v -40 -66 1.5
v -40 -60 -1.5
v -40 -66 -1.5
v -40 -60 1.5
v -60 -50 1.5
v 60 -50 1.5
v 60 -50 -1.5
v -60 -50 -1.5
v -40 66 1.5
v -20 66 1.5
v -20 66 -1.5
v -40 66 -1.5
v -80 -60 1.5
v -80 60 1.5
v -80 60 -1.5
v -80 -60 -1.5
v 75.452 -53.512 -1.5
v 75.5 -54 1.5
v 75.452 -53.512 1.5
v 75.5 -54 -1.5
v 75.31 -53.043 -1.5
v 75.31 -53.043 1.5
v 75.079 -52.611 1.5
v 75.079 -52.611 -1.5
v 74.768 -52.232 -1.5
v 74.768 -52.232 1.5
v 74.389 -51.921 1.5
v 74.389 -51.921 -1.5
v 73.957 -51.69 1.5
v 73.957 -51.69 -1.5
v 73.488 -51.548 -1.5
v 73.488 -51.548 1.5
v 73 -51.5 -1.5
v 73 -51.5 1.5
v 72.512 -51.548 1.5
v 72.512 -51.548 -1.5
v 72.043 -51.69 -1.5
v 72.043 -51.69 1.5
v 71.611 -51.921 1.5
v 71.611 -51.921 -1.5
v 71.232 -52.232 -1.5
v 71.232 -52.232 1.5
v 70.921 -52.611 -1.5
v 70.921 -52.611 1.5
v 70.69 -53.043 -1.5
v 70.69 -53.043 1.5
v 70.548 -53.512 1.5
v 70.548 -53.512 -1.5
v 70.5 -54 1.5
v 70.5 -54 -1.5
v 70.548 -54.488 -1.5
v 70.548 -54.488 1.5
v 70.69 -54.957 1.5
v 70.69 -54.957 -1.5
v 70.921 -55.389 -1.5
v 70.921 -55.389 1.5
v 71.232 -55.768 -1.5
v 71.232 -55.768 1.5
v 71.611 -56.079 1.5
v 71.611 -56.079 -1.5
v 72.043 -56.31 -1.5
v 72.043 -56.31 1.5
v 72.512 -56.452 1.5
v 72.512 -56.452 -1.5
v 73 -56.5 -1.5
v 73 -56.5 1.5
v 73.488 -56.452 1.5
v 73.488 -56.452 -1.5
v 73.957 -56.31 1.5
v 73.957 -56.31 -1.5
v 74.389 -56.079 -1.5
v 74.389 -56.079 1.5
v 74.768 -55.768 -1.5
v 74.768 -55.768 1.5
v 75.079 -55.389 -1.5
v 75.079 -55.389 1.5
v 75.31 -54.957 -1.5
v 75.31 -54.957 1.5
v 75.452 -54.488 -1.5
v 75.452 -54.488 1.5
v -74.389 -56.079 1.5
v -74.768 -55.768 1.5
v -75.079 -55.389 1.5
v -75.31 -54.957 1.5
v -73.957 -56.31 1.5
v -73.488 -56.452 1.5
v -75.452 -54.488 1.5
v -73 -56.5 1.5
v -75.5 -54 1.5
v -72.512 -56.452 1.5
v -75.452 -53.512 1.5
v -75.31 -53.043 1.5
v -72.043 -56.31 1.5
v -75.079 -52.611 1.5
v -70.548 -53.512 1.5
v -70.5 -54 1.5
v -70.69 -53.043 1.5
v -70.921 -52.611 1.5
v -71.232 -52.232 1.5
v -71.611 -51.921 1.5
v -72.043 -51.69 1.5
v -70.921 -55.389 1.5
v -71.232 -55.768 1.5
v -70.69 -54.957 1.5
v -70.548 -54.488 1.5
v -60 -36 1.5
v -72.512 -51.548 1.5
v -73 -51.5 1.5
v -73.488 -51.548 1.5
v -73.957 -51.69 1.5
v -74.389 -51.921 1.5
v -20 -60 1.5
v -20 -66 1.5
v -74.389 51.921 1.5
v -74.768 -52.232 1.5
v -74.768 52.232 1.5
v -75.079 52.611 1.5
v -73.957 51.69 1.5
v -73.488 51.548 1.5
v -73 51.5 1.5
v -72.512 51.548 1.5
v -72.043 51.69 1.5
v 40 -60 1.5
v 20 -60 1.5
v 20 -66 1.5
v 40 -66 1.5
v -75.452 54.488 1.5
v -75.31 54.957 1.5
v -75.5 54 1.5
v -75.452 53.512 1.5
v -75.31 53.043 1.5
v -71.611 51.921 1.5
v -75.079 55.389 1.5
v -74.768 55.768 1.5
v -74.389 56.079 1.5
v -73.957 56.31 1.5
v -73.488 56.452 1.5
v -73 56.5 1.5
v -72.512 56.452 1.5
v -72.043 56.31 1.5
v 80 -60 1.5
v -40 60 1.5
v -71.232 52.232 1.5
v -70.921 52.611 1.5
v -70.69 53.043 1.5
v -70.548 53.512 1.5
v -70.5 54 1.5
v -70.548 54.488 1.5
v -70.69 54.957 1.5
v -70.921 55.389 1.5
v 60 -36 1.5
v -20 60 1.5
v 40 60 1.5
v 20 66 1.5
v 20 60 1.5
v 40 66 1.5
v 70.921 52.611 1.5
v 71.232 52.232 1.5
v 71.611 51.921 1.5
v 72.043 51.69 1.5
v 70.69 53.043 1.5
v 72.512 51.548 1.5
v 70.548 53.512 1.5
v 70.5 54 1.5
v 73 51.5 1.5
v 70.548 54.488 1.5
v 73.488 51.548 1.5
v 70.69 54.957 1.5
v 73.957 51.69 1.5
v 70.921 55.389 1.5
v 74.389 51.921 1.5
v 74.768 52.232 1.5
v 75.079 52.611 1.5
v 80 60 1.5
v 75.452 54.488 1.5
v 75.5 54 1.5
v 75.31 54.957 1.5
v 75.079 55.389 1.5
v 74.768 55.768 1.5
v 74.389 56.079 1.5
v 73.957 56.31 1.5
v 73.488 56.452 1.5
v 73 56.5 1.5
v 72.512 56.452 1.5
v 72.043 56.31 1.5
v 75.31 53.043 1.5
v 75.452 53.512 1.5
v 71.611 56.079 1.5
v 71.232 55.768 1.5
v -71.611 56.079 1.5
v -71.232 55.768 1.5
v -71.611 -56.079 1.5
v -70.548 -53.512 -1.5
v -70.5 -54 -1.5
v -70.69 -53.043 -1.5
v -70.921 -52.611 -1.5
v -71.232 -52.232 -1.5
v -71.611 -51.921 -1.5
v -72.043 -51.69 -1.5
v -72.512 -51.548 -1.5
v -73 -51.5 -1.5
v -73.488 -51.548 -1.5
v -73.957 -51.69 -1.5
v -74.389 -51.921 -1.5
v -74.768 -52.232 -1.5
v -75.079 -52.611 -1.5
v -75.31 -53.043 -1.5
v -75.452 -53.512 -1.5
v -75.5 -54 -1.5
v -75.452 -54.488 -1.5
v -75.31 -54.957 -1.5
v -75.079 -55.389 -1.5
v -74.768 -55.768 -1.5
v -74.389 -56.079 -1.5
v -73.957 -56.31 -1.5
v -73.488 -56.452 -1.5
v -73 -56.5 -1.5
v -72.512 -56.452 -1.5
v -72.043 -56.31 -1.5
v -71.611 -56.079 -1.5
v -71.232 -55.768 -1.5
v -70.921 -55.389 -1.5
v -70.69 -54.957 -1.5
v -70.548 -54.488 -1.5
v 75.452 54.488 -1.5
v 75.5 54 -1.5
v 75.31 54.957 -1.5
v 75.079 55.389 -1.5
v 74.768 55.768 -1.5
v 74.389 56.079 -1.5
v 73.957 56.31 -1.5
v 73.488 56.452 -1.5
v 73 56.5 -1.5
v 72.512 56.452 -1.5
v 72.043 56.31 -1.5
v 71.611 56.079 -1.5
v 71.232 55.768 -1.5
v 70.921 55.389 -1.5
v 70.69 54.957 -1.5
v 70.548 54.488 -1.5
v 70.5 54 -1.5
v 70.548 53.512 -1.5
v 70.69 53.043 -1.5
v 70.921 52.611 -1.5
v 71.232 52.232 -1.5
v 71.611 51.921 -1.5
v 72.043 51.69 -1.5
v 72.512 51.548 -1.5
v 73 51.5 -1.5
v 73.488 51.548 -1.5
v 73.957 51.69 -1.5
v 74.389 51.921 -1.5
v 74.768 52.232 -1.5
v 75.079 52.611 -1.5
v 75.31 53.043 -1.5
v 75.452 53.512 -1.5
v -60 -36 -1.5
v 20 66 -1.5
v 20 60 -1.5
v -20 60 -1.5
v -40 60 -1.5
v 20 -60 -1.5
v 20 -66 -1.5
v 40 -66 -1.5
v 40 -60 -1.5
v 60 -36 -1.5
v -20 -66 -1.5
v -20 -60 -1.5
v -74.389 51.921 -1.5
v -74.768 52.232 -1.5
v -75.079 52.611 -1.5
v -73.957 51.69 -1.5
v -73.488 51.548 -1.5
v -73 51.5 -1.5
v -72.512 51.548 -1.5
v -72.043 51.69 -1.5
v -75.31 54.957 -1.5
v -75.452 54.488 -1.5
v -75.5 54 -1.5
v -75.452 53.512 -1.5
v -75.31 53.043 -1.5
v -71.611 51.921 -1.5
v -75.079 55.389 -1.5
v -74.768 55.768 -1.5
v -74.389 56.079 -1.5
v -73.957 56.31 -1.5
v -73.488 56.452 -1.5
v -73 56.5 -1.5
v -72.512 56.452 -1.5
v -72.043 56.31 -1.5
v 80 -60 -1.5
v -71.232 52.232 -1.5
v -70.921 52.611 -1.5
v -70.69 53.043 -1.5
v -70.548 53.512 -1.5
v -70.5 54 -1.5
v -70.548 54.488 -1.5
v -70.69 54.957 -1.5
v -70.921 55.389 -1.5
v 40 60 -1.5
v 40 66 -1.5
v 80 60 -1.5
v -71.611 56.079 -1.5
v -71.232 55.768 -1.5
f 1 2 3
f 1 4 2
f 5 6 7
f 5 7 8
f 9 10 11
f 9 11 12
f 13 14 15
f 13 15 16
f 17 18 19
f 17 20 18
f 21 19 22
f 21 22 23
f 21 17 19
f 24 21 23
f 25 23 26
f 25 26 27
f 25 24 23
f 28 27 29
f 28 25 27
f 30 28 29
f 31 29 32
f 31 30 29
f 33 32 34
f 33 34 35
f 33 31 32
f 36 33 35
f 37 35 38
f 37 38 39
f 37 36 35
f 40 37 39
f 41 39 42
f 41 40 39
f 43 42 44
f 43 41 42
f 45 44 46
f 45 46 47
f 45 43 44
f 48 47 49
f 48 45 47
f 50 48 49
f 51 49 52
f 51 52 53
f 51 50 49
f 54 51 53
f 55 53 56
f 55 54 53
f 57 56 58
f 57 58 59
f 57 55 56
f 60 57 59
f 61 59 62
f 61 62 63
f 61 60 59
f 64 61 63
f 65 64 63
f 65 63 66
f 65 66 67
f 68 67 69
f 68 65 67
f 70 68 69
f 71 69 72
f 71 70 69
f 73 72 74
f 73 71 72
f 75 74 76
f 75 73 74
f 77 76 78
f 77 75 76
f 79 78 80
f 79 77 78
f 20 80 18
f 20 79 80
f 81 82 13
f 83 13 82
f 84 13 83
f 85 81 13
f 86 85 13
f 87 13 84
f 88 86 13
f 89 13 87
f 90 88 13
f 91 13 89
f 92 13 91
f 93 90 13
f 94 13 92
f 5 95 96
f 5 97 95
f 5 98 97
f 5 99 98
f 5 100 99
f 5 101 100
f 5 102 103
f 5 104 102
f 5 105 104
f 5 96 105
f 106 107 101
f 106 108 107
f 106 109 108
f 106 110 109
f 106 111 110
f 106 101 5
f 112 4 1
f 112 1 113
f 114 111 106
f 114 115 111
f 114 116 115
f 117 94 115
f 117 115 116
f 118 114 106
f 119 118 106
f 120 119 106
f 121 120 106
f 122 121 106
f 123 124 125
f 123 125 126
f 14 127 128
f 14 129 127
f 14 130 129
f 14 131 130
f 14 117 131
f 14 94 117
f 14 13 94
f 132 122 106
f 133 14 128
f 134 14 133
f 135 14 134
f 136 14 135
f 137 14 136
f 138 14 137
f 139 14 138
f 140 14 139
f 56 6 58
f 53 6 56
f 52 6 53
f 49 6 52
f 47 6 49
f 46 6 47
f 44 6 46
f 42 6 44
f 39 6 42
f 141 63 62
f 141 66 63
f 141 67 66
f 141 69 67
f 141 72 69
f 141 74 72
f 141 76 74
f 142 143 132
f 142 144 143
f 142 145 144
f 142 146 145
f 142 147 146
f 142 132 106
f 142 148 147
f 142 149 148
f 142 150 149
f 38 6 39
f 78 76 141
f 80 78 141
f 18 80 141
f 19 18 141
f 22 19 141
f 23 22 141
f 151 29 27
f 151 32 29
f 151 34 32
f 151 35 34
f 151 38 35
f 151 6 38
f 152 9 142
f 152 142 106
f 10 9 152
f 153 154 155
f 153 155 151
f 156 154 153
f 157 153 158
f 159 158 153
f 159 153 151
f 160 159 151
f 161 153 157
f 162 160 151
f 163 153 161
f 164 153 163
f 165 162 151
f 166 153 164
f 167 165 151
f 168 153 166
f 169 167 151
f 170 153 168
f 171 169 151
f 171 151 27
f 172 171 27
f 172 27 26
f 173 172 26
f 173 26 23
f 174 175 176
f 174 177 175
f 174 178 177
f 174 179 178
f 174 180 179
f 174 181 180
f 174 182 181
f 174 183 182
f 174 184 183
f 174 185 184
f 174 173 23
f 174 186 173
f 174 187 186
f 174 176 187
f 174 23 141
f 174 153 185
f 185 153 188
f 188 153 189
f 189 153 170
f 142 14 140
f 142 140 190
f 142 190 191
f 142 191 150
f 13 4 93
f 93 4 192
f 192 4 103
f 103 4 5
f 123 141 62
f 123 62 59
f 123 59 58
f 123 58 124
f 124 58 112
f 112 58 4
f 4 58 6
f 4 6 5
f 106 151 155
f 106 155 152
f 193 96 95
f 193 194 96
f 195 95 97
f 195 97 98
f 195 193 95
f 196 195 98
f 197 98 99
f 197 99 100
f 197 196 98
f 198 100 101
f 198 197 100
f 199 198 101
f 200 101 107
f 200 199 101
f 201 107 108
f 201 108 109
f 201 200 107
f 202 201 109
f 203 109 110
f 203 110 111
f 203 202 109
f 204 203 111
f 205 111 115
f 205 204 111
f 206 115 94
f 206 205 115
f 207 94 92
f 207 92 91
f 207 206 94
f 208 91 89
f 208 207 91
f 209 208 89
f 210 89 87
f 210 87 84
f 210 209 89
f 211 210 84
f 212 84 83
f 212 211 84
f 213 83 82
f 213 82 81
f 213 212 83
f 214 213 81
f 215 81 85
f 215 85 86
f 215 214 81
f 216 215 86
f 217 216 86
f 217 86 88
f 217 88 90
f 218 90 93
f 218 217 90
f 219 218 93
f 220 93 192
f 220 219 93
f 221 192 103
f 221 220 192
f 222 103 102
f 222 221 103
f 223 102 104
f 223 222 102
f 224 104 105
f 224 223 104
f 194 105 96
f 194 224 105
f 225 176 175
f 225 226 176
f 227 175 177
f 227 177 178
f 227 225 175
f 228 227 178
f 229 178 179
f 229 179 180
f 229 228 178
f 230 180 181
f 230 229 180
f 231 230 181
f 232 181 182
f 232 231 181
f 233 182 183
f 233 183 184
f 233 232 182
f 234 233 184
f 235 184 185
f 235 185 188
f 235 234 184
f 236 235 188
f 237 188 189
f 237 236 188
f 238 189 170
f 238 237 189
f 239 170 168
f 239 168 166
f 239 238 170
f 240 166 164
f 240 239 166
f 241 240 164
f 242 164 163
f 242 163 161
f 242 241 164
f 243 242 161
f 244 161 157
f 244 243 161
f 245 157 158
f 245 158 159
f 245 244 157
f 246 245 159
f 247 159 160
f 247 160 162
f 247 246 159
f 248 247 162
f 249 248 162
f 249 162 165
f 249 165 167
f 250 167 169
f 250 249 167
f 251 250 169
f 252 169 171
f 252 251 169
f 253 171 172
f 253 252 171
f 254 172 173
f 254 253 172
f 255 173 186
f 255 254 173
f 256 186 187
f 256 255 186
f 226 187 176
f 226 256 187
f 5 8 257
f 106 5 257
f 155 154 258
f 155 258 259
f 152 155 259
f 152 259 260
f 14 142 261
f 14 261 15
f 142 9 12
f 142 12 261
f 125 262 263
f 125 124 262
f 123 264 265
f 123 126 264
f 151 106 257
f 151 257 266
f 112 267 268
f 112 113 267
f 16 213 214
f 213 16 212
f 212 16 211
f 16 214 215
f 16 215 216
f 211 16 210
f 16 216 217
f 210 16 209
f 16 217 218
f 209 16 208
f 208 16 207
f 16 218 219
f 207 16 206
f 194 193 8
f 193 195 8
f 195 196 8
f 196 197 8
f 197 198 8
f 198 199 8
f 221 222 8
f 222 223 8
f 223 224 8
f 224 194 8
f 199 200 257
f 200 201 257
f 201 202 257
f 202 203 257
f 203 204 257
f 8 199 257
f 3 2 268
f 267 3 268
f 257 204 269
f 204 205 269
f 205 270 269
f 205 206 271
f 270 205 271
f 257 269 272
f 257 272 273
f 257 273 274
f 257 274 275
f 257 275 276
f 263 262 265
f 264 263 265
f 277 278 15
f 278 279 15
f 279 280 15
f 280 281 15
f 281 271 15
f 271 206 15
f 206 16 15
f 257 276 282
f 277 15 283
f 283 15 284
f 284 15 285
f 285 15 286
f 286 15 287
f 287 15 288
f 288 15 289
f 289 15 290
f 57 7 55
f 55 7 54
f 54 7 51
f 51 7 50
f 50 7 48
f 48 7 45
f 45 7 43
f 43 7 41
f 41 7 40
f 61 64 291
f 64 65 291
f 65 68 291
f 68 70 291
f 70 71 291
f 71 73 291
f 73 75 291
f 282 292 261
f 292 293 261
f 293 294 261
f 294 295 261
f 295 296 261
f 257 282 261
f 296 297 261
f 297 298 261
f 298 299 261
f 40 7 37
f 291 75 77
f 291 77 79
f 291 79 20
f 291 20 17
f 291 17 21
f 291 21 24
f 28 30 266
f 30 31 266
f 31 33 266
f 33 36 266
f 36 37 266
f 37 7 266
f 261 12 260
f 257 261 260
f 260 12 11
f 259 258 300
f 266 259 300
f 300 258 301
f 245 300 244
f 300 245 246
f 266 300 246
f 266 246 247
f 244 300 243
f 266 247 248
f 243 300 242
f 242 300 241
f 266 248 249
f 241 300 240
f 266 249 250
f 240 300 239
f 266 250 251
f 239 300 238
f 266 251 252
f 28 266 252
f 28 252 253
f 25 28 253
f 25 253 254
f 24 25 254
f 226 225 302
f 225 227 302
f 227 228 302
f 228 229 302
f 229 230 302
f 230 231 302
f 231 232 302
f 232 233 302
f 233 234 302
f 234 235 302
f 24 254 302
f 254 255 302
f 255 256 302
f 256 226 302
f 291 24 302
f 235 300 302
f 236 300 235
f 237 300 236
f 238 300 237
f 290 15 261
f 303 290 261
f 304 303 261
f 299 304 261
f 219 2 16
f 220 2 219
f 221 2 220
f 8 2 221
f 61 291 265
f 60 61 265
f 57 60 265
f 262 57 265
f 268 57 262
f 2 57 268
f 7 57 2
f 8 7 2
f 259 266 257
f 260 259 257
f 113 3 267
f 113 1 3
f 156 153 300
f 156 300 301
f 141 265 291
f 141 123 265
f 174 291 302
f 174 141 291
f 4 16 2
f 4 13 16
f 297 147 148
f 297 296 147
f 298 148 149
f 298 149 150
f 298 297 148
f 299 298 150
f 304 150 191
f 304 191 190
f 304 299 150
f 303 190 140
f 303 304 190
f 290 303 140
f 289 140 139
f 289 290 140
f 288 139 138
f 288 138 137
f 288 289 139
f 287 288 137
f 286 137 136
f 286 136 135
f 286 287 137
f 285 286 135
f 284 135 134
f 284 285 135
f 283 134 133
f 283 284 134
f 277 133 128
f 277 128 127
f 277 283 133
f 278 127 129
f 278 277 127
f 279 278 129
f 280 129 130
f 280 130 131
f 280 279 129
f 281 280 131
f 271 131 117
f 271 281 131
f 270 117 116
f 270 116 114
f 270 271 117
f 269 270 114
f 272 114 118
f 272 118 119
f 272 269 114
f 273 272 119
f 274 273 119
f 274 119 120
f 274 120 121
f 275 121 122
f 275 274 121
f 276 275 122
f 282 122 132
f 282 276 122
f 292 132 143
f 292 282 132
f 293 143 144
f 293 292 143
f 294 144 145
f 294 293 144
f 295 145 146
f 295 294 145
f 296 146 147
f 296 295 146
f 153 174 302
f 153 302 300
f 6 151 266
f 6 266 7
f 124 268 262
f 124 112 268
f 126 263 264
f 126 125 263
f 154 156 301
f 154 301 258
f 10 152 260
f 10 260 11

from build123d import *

# Parameters (mm, degrees)
F0_R     = 2.5
F1_DEPTH = 1.5


with BuildPart() as f1:
    # F0 (on Top) → F1 (new body, symmetric)
    with BuildSketch(Plane.XY):
        Polygon((80, -60), (80, 60), (40, 60), (40, 66), (20, 66), (20, 60), (-20, 60), (-20, 66), (-40, 66), (-40, 60), (-80, 60), (-80, -60), (-40, -60), (-40, -66), (-20, -66), (-20, -60), (20, -60), (20, -66), (40, -66), (40, -60), align=None)
        with Locations((-73, -54)):
            Circle(F0_R, mode=Mode.SUBTRACT)
        Polygon((60, -50), (0, -50), (-60, -50), (-60, -36), (60, -36), align=None, mode=Mode.SUBTRACT)
        with Locations((73, -54)):
            Circle(F0_R, mode=Mode.SUBTRACT)
        with Locations((-73, 54)):
            Circle(F0_R, mode=Mode.SUBTRACT)
        with Locations((73, 54)):
            Circle(F0_R, mode=Mode.SUBTRACT)
    extrude(amount=F1_DEPTH, both=True)


solid = f1.part
